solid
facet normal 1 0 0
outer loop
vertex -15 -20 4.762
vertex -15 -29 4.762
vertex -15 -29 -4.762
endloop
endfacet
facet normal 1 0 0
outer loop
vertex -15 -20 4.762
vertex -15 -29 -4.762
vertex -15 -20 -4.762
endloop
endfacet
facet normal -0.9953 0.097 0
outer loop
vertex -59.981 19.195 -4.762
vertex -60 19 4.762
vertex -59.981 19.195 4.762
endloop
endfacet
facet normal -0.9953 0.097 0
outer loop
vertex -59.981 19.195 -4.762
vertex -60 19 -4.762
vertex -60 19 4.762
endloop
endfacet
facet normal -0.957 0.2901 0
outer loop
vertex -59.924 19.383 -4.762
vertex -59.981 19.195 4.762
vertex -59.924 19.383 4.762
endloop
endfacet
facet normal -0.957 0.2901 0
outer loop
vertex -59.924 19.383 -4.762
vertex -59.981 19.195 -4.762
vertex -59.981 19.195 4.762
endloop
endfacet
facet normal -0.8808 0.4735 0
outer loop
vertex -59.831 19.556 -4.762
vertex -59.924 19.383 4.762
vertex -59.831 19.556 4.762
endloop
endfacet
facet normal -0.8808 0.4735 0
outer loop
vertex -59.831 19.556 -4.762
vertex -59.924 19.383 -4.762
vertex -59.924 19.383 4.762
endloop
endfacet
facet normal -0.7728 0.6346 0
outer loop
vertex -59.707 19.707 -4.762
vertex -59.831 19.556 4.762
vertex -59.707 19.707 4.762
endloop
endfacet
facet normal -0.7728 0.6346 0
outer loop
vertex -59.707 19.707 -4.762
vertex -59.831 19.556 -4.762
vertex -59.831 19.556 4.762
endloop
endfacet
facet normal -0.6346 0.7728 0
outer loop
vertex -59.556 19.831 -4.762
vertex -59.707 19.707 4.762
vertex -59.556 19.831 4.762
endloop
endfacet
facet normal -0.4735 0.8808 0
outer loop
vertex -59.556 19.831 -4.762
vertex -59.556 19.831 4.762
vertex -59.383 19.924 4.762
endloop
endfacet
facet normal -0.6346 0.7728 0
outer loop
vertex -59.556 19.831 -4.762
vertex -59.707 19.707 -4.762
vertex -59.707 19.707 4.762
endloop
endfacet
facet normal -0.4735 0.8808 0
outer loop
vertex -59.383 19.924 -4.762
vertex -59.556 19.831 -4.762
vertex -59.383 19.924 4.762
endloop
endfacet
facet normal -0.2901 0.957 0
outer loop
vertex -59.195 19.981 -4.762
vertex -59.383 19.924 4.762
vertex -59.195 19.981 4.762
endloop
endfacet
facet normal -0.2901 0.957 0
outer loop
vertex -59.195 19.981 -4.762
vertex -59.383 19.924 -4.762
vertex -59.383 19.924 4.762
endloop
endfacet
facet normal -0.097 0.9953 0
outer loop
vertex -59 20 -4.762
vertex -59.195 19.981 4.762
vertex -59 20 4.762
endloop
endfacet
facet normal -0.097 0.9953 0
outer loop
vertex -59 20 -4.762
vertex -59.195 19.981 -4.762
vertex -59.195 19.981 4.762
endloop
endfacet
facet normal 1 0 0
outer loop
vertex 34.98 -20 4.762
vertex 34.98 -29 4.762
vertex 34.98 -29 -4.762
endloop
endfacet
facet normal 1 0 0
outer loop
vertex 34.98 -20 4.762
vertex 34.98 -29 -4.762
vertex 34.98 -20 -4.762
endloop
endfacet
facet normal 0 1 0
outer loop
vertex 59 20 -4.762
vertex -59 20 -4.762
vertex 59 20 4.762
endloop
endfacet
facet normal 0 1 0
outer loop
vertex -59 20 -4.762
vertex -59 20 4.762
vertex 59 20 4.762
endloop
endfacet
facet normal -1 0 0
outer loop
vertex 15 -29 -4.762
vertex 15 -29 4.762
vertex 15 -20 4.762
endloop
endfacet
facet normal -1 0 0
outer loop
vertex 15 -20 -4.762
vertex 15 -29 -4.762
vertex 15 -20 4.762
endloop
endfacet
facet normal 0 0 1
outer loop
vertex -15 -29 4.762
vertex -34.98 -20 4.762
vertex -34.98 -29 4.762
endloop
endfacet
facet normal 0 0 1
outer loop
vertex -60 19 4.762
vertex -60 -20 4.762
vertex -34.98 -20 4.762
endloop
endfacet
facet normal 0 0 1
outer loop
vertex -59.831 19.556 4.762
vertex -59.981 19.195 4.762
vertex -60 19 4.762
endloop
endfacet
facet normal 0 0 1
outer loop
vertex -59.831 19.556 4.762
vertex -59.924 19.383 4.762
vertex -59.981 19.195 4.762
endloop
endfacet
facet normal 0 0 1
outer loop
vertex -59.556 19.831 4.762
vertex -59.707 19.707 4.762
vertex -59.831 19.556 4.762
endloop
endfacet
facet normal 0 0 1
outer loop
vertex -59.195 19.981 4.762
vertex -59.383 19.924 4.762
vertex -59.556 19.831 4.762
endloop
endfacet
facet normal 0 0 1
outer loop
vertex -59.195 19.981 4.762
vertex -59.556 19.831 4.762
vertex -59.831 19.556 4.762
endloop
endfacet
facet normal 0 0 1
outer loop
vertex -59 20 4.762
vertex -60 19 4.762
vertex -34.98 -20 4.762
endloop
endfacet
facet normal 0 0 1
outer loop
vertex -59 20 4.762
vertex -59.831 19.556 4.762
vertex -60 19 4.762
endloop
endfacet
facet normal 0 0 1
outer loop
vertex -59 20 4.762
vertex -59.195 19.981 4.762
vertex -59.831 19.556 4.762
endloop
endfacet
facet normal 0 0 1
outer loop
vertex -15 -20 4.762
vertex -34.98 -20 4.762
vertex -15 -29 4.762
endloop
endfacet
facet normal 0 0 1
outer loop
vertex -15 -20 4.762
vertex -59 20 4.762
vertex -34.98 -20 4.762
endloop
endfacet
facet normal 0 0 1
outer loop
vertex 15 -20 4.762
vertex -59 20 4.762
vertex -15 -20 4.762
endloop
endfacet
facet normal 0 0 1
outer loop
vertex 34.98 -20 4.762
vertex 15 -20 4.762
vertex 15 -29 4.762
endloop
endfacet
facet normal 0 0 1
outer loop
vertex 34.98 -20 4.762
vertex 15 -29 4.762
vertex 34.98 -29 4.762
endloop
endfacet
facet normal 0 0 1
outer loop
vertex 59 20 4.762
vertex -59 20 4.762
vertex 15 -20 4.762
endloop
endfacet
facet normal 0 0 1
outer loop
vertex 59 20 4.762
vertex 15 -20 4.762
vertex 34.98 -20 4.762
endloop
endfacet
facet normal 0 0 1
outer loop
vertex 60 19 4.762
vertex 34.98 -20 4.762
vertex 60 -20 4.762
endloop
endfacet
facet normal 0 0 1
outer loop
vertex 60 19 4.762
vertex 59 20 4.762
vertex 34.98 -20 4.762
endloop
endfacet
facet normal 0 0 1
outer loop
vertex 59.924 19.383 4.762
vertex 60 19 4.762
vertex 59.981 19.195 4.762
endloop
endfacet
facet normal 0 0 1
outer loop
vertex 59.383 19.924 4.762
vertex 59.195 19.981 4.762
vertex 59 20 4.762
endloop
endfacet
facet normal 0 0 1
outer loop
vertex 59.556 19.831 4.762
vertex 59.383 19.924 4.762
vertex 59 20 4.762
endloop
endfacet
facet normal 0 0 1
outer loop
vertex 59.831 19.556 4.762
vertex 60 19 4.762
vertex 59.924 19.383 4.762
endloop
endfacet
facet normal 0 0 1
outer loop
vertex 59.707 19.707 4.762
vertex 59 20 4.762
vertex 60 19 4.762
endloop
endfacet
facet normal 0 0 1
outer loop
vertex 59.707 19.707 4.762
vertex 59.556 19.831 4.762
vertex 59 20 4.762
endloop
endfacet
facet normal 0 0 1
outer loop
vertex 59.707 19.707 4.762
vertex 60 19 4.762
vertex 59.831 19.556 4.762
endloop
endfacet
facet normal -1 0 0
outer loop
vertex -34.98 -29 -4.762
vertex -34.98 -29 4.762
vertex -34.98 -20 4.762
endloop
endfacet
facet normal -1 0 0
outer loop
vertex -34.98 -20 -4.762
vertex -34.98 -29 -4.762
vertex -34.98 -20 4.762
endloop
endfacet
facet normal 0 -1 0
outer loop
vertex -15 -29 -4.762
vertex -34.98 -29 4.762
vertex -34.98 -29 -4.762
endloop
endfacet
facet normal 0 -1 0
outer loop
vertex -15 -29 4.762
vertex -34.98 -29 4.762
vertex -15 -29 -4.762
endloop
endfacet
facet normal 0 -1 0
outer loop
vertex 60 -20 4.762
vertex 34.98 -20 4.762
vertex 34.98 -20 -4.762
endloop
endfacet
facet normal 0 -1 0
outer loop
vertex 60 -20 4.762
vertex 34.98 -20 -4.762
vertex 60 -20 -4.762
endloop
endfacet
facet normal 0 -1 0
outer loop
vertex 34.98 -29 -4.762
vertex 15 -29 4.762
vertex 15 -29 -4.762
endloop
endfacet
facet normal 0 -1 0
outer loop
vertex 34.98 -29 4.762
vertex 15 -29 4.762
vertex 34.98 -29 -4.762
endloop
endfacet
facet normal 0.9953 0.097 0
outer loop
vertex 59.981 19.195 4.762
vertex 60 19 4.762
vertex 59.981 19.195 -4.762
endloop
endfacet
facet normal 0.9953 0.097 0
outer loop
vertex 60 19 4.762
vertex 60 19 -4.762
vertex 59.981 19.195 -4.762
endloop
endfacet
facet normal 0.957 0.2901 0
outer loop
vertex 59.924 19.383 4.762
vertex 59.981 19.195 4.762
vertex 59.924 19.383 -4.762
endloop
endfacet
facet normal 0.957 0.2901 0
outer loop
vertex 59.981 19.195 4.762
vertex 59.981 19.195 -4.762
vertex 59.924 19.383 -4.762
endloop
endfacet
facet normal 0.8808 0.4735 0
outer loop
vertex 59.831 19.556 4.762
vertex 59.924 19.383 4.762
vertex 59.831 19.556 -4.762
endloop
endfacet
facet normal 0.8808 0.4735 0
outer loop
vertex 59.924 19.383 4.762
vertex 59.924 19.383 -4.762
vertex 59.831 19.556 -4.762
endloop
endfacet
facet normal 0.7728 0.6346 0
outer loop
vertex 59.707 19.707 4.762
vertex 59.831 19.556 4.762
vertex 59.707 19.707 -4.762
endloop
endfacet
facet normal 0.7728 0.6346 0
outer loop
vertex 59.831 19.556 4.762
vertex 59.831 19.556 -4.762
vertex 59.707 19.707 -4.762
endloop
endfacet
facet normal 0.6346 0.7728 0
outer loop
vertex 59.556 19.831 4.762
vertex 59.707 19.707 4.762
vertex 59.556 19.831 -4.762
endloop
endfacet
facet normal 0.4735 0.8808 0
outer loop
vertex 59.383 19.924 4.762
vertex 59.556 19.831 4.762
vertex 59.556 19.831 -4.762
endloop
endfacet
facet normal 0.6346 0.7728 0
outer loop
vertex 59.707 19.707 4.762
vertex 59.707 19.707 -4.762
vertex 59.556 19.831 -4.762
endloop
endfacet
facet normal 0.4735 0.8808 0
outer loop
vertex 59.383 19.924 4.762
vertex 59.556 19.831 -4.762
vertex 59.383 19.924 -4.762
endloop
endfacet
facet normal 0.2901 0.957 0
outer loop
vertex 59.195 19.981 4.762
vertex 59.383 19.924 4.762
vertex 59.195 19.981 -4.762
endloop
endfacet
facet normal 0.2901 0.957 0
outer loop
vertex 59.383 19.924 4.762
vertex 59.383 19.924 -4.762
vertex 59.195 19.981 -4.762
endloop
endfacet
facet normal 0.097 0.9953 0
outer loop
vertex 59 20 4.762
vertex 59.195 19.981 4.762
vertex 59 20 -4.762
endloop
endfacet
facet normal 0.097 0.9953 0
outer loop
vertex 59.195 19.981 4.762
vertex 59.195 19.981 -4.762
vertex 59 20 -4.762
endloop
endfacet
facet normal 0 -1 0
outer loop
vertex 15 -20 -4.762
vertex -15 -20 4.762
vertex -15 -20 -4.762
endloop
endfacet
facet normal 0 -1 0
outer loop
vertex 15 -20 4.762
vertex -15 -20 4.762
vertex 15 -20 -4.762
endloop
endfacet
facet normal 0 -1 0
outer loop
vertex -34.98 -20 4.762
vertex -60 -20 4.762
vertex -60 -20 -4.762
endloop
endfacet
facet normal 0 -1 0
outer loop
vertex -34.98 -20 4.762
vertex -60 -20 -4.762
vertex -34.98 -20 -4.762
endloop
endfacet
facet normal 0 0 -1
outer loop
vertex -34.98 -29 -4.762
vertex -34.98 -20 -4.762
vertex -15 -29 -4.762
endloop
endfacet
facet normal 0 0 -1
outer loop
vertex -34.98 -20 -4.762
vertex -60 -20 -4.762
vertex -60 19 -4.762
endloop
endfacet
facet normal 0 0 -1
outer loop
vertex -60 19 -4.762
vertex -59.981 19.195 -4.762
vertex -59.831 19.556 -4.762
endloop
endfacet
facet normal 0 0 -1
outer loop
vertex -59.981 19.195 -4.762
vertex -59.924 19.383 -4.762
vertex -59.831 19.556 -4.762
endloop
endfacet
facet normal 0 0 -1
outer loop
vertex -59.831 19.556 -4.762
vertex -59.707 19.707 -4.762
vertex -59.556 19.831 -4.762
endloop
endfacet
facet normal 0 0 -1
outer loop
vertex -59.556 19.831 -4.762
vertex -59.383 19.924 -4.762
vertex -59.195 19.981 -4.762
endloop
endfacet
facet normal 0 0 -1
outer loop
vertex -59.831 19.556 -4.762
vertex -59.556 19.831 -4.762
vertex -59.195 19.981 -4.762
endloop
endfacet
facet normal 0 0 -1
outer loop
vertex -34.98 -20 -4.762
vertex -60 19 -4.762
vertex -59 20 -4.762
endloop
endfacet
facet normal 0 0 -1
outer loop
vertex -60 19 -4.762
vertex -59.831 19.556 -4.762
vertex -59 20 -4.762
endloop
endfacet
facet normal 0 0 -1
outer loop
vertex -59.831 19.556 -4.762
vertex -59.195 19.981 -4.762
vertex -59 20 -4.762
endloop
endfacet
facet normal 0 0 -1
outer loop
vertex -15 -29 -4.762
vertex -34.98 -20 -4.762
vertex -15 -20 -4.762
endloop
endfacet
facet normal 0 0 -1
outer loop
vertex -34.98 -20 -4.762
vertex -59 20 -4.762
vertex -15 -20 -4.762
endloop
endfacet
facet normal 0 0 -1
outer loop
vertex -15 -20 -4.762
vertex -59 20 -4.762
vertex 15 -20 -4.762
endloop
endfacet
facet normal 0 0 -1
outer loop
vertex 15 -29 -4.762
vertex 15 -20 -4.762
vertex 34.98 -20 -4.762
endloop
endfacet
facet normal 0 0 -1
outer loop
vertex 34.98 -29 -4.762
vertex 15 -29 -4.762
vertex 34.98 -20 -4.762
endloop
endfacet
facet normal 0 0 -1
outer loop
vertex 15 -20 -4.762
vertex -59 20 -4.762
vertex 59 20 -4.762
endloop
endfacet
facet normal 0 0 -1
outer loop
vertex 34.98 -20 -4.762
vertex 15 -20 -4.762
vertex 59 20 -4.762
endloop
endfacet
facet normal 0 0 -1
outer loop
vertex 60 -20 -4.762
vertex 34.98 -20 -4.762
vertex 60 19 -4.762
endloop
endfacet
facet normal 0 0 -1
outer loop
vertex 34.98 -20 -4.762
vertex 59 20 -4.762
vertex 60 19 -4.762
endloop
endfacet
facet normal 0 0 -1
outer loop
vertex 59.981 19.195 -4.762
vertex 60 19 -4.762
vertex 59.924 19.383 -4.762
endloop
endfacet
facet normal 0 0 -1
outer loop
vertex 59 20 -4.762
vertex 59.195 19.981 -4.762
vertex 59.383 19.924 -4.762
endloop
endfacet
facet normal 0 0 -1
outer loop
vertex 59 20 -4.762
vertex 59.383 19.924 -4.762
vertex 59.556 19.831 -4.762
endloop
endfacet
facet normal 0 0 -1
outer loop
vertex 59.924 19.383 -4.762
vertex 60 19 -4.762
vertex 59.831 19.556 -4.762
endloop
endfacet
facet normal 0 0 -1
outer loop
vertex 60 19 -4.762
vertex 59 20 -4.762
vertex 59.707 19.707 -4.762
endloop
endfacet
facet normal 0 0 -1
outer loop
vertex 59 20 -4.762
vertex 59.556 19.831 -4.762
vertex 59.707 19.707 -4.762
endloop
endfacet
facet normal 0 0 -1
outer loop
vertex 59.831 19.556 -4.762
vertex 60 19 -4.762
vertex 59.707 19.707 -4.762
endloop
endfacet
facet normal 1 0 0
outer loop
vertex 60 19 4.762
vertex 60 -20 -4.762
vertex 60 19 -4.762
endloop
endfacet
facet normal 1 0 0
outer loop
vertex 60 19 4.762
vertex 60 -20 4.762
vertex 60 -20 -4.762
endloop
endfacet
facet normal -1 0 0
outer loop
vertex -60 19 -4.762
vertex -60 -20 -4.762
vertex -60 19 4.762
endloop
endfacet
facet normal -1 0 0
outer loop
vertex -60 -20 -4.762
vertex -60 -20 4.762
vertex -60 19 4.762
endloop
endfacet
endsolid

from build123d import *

# Parameters (mm, degrees)
SKETCH1_W           = 120
SKETCH1_H           = 40
SKETCH1_W_2         = 19.98
SKETCH1_H_2         = 9
BOSS_EXTRUDE1_DEPTH = 4.7625
FILLET1_R           = 1


with BuildPart() as part:
    # Sketch1 → Boss-Extrude1 (new, symmetric)
    with BuildSketch(Plane.XY):
        Rectangle(SKETCH1_W, SKETCH1_H)
        with Locations((-24.99, -24.5)):
            Rectangle(SKETCH1_W_2, SKETCH1_H_2)
        with Locations((24.99, -24.5)):
            Rectangle(SKETCH1_W_2, SKETCH1_H_2)
    extrude(amount=BOSS_EXTRUDE1_DEPTH, both=True)

    # Fillet1
    fillet1_edges = [part.edges().sort_by_distance(p)[0] for p in [
        (-60, 20, 0),
        (60, 20, 0),
    ]]
    fillet(fillet1_edges, radius=FILLET1_R)


solid = part.part
